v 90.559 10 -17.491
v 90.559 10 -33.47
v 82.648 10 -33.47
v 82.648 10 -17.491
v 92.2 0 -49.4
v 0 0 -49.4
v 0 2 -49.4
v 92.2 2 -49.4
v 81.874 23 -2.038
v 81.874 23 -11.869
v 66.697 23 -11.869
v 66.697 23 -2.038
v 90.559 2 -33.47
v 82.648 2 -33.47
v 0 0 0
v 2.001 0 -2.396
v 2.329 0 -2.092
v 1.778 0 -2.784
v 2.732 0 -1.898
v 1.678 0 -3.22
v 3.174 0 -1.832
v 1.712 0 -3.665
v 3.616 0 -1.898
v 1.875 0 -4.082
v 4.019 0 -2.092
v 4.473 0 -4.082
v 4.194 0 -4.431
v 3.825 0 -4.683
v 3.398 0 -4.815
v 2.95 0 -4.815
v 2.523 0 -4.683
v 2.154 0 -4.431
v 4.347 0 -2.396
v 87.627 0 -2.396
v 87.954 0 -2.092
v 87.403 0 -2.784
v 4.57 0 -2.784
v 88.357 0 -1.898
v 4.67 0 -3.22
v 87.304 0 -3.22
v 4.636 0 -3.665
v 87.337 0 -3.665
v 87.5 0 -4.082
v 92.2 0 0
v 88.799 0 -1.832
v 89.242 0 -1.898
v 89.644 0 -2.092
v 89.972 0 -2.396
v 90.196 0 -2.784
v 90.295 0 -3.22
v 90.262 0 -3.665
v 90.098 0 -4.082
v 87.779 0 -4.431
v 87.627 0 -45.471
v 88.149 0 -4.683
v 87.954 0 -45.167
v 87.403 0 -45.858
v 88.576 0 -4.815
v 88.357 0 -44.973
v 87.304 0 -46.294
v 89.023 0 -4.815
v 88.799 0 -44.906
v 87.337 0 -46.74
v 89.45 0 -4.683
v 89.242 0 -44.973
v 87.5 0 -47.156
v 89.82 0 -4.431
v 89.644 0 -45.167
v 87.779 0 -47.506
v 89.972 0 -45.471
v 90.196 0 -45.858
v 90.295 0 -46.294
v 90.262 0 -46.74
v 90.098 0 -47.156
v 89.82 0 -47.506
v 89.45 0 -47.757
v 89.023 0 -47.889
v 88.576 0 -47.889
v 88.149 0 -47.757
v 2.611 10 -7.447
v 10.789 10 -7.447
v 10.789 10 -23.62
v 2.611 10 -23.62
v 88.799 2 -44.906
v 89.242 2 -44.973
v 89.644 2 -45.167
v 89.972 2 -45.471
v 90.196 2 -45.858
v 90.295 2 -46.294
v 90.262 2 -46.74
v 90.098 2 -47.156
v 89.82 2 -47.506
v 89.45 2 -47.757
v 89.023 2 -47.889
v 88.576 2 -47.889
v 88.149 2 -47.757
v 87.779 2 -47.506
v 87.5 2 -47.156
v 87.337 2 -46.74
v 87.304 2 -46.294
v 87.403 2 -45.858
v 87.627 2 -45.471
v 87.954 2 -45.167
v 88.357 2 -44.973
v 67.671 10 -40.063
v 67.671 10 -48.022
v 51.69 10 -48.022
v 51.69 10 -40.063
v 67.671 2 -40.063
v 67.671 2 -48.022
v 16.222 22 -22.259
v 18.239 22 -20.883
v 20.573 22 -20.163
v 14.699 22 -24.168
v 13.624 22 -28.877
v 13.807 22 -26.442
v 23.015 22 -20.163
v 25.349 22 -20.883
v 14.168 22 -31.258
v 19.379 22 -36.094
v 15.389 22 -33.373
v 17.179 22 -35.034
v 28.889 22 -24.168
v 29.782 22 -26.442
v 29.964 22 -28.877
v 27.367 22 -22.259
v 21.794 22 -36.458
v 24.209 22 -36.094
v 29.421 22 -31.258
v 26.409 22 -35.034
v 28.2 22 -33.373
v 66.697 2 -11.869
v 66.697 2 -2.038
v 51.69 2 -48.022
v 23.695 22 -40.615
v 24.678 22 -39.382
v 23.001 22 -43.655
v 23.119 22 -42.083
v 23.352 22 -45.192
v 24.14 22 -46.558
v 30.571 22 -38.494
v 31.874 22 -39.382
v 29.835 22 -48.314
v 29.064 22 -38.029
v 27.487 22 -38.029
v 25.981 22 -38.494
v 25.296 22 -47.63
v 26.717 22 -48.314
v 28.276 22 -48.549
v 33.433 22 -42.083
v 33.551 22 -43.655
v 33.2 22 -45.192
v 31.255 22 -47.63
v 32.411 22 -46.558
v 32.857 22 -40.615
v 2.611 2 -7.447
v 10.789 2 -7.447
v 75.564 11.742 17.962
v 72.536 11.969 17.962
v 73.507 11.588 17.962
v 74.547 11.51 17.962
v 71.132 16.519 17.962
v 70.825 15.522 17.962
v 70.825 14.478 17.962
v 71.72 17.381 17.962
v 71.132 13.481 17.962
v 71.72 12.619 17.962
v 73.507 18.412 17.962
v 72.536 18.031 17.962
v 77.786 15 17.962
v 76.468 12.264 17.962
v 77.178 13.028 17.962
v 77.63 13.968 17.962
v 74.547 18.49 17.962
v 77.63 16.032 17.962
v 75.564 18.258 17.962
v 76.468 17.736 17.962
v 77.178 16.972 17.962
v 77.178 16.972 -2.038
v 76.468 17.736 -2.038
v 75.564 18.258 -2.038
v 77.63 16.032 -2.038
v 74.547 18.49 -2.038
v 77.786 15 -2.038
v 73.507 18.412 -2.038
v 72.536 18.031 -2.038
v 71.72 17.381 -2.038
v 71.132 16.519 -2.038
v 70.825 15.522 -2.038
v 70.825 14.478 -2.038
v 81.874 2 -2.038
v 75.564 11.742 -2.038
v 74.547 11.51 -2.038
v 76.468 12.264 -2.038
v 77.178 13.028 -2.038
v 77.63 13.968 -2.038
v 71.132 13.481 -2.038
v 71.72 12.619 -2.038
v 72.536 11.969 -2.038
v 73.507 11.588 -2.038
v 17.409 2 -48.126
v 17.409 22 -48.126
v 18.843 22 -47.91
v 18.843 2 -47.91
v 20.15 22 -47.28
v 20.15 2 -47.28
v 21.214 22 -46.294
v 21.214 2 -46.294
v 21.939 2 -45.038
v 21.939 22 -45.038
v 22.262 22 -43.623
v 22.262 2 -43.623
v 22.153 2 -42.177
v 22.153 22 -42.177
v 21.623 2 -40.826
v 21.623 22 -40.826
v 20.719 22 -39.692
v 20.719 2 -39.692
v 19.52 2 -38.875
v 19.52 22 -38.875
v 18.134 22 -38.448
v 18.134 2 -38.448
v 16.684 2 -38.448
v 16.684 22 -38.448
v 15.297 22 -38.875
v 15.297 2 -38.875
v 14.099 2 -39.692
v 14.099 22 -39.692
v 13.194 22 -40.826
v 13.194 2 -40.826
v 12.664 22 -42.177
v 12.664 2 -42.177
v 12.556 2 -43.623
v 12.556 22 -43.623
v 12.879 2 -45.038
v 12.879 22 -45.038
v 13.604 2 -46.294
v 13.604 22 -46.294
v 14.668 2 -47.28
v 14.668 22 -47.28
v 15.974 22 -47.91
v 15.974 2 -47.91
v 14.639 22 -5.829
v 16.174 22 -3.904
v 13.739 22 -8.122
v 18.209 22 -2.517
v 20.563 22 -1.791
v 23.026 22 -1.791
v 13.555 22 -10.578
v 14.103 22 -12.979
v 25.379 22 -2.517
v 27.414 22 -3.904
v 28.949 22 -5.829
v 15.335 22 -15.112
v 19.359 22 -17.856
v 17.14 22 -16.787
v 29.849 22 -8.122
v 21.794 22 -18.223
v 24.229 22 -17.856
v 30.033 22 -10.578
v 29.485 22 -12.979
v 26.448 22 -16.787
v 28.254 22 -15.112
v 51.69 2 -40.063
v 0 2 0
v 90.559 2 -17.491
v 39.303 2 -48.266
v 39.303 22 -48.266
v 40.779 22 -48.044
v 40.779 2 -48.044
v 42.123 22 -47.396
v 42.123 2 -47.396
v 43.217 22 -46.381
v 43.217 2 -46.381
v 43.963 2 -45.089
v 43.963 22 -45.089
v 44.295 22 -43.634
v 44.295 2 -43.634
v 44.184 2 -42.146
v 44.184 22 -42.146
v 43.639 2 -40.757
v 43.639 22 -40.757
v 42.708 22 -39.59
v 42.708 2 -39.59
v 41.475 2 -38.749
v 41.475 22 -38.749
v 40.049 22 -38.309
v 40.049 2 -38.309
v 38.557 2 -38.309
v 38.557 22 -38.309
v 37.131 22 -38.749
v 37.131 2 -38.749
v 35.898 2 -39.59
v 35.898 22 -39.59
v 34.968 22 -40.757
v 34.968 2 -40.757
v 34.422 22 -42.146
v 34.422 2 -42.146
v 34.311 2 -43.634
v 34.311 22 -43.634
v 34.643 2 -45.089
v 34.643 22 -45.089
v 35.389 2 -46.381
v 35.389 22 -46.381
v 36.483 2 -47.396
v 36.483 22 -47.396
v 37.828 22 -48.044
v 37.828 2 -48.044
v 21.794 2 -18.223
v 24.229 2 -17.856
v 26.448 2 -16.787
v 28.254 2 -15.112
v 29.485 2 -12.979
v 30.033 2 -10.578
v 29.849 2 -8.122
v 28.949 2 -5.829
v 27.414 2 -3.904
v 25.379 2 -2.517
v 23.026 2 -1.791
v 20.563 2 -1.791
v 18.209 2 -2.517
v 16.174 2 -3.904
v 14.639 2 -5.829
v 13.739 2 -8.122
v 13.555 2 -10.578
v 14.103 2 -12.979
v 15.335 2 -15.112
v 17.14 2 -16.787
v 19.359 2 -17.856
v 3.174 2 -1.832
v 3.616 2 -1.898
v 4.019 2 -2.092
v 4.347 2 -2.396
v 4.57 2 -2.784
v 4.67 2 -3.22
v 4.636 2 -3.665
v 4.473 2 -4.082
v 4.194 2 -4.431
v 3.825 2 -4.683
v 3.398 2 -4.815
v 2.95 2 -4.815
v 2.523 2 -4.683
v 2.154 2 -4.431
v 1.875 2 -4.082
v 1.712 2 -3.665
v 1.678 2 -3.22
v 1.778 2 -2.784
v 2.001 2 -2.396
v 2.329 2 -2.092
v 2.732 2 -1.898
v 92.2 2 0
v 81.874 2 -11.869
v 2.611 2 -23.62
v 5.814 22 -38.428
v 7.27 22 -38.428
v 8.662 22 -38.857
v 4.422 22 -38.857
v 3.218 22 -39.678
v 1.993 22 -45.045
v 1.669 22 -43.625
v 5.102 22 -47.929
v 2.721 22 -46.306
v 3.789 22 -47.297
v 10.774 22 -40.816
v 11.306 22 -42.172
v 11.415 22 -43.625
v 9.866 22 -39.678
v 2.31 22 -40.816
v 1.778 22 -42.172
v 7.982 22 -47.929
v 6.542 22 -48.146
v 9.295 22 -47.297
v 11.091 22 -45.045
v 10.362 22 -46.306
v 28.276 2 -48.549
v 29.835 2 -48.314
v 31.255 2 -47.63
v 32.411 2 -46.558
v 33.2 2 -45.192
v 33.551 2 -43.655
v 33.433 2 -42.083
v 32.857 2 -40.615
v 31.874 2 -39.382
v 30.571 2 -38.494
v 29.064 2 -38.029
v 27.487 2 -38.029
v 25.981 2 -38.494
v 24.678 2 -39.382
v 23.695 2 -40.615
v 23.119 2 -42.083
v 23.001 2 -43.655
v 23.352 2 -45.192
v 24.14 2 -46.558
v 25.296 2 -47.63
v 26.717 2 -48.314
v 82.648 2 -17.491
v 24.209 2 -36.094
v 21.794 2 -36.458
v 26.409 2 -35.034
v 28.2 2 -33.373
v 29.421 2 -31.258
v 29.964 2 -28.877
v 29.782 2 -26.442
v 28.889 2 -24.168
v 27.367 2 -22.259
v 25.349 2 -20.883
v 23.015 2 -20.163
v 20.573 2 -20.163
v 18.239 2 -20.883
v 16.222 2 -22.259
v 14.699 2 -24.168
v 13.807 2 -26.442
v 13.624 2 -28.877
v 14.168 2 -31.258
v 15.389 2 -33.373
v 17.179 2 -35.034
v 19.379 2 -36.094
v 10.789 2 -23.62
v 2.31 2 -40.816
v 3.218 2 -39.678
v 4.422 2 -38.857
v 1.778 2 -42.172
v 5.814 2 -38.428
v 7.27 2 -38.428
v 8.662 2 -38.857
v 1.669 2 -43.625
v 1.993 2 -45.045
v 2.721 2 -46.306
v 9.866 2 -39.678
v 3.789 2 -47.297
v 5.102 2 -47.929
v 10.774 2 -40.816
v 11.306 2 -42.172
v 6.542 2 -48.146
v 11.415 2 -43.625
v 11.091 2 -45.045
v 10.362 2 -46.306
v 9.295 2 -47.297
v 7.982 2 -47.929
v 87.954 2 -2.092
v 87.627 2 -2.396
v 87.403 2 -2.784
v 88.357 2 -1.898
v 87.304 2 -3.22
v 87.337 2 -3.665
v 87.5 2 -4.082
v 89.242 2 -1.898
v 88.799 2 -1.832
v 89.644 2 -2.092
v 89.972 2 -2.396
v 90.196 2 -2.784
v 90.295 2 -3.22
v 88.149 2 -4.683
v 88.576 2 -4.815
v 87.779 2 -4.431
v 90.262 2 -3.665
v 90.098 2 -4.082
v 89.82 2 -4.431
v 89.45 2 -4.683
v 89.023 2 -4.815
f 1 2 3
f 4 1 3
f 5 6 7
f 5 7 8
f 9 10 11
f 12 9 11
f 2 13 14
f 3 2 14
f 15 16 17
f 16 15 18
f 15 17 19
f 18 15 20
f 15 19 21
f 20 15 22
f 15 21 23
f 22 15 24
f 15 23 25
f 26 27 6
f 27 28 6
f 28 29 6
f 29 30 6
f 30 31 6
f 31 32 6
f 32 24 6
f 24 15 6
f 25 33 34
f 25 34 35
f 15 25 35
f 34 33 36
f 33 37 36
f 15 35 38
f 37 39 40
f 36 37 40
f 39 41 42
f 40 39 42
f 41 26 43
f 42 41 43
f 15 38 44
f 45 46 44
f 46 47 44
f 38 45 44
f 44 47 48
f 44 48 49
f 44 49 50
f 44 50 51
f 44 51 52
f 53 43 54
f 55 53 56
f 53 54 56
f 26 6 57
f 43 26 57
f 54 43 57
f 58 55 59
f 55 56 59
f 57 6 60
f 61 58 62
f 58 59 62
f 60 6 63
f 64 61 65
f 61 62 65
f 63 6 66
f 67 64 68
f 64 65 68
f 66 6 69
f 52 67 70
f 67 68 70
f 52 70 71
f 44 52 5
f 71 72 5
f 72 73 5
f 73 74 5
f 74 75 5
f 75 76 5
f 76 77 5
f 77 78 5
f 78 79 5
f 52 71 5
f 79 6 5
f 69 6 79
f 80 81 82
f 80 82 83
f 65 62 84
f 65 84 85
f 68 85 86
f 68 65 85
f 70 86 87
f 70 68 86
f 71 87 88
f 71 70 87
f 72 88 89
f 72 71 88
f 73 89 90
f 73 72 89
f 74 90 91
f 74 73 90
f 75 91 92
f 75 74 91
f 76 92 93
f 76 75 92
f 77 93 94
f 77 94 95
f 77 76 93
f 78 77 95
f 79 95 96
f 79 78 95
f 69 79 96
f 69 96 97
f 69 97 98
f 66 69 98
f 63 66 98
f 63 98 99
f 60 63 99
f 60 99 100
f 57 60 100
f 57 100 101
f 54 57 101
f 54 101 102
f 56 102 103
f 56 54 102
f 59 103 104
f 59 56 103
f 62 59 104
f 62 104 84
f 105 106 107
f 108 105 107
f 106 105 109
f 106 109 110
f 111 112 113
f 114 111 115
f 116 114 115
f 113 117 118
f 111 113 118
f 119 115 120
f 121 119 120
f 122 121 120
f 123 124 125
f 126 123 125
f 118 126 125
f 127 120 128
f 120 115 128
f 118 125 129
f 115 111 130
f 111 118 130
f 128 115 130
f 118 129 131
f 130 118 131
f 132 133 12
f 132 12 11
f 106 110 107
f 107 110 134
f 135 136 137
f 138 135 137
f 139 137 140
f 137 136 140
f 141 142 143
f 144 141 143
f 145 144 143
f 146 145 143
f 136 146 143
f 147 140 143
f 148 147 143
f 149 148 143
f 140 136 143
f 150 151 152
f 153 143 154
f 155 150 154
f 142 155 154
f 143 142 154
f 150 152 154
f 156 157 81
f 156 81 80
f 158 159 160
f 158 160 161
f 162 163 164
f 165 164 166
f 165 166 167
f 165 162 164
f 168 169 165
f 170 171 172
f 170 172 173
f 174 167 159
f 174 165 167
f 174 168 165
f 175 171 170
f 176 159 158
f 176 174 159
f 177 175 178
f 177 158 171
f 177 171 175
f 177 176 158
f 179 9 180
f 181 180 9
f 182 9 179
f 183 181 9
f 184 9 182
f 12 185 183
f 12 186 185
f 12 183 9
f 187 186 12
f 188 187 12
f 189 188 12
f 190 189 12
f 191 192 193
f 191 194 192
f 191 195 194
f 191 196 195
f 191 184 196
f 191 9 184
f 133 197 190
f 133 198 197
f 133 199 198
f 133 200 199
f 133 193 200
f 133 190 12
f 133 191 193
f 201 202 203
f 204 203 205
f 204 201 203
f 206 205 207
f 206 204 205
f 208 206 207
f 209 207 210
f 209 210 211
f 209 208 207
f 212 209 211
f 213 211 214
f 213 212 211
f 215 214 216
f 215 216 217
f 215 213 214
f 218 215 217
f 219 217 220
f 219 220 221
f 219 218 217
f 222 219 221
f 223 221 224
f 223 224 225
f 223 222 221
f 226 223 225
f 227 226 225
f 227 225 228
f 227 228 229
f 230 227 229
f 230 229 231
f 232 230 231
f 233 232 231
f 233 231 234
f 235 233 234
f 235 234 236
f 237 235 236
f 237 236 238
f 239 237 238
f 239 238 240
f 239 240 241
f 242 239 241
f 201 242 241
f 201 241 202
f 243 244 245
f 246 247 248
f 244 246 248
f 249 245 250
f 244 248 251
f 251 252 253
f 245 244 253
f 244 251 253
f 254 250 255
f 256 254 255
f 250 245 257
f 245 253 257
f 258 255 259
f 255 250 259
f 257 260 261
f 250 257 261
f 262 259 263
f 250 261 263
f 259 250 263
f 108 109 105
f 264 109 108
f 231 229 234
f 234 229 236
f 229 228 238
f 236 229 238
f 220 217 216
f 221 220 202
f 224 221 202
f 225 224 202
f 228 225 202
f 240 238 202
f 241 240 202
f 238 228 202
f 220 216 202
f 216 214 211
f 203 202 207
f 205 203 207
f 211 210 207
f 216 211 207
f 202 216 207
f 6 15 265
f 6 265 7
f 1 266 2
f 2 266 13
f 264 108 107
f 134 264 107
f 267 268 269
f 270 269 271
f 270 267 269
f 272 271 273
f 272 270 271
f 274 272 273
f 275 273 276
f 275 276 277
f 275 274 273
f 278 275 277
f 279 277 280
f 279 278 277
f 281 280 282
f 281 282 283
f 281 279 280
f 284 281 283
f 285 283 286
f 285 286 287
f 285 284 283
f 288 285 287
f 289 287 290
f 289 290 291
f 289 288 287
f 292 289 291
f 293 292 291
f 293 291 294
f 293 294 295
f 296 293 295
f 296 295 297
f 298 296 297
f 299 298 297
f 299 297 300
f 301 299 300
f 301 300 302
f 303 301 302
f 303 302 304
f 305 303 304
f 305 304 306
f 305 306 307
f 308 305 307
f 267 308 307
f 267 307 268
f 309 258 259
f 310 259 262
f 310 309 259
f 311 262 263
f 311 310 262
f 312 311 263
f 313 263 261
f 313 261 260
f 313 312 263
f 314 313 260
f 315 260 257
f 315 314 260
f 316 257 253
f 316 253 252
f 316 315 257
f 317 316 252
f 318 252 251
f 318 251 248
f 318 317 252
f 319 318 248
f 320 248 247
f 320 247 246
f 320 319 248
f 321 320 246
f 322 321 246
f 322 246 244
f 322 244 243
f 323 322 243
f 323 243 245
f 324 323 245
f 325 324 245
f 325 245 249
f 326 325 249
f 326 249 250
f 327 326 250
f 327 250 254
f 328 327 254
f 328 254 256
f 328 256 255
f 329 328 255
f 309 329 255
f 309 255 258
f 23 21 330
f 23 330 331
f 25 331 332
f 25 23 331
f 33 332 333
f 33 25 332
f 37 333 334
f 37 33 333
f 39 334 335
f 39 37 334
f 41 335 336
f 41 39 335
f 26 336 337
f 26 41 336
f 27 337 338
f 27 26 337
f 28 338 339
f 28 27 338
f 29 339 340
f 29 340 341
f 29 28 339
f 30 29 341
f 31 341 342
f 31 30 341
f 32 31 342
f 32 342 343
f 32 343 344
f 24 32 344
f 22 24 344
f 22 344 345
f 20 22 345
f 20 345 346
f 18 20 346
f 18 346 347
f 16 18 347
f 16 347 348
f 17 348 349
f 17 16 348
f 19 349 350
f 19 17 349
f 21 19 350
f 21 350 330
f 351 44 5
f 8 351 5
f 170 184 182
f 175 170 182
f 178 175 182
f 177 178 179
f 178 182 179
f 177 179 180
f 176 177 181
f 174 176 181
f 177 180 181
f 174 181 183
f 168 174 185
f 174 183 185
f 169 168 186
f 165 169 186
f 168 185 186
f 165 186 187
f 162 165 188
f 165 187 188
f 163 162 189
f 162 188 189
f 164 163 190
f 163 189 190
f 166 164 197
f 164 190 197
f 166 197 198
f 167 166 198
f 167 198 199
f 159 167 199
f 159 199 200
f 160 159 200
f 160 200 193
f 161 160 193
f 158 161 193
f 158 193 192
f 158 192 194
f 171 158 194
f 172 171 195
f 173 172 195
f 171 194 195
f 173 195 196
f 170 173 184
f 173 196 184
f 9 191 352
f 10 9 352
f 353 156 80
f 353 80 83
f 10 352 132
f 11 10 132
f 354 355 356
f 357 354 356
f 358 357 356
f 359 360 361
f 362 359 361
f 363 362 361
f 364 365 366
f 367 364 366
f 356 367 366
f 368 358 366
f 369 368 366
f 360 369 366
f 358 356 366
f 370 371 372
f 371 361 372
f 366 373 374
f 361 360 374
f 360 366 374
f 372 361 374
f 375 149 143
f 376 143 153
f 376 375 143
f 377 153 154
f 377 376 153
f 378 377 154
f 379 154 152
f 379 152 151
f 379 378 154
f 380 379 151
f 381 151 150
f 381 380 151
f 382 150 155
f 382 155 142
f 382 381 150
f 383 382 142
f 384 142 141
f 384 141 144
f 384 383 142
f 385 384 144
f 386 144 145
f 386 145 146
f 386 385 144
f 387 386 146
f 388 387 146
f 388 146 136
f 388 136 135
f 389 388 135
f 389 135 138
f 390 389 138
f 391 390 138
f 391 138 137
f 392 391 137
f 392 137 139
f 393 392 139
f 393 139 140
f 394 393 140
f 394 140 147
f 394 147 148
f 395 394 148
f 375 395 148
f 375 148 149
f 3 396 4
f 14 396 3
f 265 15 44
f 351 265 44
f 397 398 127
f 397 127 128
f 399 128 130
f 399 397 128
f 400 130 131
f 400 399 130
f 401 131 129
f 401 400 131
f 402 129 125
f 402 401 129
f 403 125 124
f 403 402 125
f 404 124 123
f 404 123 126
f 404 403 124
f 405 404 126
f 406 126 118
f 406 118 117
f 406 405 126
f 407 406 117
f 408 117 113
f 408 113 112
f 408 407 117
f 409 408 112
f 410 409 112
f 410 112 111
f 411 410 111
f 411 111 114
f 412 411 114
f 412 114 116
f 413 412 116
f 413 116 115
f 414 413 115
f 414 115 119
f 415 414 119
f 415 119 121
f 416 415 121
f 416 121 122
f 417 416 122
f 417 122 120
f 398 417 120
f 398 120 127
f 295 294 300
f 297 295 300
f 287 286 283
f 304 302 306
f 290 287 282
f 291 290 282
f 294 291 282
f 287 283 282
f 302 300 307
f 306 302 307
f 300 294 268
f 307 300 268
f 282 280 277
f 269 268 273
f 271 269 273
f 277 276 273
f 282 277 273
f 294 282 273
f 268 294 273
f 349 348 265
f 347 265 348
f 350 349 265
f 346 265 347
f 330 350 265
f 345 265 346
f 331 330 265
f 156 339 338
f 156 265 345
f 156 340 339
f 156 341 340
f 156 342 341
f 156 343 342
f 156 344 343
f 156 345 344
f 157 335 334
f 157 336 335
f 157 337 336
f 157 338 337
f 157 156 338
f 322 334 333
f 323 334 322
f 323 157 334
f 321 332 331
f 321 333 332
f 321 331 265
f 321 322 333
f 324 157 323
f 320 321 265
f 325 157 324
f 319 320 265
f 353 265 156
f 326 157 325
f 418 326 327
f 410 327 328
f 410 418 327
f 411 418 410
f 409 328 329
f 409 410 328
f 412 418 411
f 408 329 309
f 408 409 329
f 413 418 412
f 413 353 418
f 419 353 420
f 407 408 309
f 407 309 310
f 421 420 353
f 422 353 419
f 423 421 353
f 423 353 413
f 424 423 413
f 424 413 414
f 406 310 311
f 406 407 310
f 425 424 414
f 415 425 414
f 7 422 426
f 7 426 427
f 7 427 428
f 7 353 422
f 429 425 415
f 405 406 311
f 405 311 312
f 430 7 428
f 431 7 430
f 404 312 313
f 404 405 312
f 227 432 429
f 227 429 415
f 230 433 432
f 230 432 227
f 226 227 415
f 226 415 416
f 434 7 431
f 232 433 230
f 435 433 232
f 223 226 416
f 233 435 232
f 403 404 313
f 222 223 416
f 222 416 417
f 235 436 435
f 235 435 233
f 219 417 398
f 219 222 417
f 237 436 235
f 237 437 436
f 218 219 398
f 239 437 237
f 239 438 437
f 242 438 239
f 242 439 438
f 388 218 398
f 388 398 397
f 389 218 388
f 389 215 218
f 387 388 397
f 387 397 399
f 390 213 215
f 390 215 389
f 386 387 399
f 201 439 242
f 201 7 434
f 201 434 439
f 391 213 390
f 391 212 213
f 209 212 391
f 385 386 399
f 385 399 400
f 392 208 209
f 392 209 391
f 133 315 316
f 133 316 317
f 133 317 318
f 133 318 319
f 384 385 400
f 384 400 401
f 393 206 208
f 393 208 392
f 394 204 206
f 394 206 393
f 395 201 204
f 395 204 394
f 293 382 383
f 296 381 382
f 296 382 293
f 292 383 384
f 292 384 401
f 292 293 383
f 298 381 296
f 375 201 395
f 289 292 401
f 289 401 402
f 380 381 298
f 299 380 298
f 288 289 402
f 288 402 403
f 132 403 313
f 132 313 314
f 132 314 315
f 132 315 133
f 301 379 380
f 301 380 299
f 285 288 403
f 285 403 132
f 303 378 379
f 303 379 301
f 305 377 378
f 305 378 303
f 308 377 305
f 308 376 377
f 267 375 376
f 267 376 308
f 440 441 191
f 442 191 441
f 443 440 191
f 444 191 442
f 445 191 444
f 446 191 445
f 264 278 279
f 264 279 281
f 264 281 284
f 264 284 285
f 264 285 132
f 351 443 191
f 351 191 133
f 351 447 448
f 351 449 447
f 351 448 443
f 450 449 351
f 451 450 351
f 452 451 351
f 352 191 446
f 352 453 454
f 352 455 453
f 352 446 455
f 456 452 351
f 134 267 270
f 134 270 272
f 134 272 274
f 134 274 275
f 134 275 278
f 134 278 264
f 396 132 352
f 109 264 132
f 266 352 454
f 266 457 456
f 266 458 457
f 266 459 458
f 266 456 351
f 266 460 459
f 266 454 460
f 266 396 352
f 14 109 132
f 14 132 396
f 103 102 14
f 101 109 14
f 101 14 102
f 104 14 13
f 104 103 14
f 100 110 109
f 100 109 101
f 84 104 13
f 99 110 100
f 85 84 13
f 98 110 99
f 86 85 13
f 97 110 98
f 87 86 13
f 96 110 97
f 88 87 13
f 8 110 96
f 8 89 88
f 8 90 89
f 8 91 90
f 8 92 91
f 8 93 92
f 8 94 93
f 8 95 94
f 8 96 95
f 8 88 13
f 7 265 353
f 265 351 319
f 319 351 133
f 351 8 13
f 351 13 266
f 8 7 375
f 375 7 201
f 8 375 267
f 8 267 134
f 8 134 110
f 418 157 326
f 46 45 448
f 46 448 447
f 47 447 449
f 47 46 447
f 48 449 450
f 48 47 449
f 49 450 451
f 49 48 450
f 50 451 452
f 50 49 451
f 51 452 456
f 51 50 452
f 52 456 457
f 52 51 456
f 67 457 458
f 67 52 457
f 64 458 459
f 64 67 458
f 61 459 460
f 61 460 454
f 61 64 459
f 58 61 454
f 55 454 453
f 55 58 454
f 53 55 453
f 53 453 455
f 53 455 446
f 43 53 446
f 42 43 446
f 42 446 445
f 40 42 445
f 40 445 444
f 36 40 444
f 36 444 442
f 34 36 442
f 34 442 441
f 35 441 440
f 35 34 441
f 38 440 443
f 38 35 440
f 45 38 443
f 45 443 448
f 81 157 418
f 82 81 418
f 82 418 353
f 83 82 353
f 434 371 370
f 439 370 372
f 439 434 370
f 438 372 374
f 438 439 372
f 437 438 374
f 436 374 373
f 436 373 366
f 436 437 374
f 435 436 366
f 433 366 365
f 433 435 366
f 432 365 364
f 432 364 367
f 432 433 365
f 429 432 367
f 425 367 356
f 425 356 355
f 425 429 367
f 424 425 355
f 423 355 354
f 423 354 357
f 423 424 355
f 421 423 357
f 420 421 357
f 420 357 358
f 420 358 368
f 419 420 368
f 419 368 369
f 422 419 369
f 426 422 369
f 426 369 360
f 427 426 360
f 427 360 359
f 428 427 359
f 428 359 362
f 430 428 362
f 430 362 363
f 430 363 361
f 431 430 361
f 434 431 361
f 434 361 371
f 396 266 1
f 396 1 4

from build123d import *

# Parameters (mm, degrees)
SKETCH1_W           = 92.2
SKETCH1_H           = 49.4
SKETCH1_R           = 1.5
SKETCH1_R_2         = 8.262166988
SKETCH1_R_3         = 8.192856998
SKETCH1_R_4         = 4.886635654
SKETCH1_R_5         = 4.866362118
SKETCH1_R_6         = 5.289603921
SKETCH1_R_7         = 5.006266963
SKETCH1_W_2         = 8.178065913
SKETCH1_H_2         = 16.173235784
SKETCH1_W_3         = 15.980396505
SKETCH1_H_3         = 7.959466721
SKETCH1_W_4         = 7.911671113
SKETCH1_H_4         = 15.979493629
SKETCH1_W_5         = 15.177608392
SKETCH1_H_5         = 9.83005725
BOSS_EXTRUDE1_DEPTH = 2
SKETCH3_W           = 8.178065913
SKETCH3_H           = 16.173235784
SKETCH3_W_2         = 15.980396505
SKETCH3_H_2         = 7.959466721
SKETCH3_W_3         = 7.911671113
SKETCH3_H_3         = 15.979493629
BOSS_EXTRUDE2_DEPTH = 10
SKETCH4_R           = 8.192856998
SKETCH4_R_2         = 8.262166988
SKETCH4_R_3         = 4.886635654
SKETCH4_R_4         = 4.866362118
SKETCH4_R_5         = 5.289603921
SKETCH4_R_6         = 5.006266963
BOSS_EXTRUDE3_DEPTH = 22
SKETCH5_W           = 15.177608392
SKETCH5_H           = 9.83005725
BOSS_EXTRUDE4_DEPTH = 23
SKETCH6_R           = 3.5
BOSS_EXTRUDE5_DEPTH = 20


with BuildPart() as part:
    # Sketch1 → Boss-Extrude1 (new body)
    with BuildSketch(Plane(origin=(0, 0, 0), x_dir=(1, 0, 0), z_dir=(0, 1, 0))):
        with Locations((46.1, 24.7)):
            Rectangle(SKETCH1_W, SKETCH1_H)
        with Locations(Location((3.173958683, 3.331705549, 0), (0, 0, 270))):
            Circle(SKETCH1_R, mode=Mode.SUBTRACT)
        with Locations(Location((88.799397051, 46.406009575, 0), (0, 0, 270))):
            Circle(SKETCH1_R, mode=Mode.SUBTRACT)
        with Locations(Location((88.799397051, 3.331705549, 0), (0, 0, 270))):
            Circle(SKETCH1_R, mode=Mode.SUBTRACT)
        with Locations(Location((21.794183192, 9.960470024, 0), (0, 0, 270))):
            Circle(SKETCH1_R_2, mode=Mode.SUBTRACT)
        with Locations(Location((21.794183192, 28.264813263, 0), (0, 0, 270))):
            Circle(SKETCH1_R_3, mode=Mode.SUBTRACT)
        with Locations(Location((6.541955346, 43.259679485, 0), (0, 0, 270))):
            Circle(SKETCH1_R_4, mode=Mode.SUBTRACT)
        with Locations(Location((17.408846233, 43.259679485, 0), (0, 0, 270))):
            Circle(SKETCH1_R_5, mode=Mode.SUBTRACT)
        with Locations(Location((28.27573712, 43.259679485, 0), (0, 0, 270))):
            Circle(SKETCH1_R_6, mode=Mode.SUBTRACT)
        with Locations(Location((39.303222454, 43.259679485, 0), (0, 0, 270))):
            Circle(SKETCH1_R_7, mode=Mode.SUBTRACT)
        with Locations((6.70046548, 15.533525735)):
            Rectangle(SKETCH1_W_2, SKETCH1_H_2, mode=Mode.SUBTRACT)
        with Locations((59.680344983, 44.042689104)):
            Rectangle(SKETCH1_W_3, SKETCH1_H_3, mode=Mode.SUBTRACT)
        with Locations((86.603660988, 25.480585451)):
            Rectangle(SKETCH1_W_4, SKETCH1_H_4, mode=Mode.SUBTRACT)
        with Locations((74.28567685, 6.953513815)):
            Rectangle(SKETCH1_W_5, SKETCH1_H_5, mode=Mode.SUBTRACT)
    extrude(amount=BOSS_EXTRUDE1_DEPTH)

    # Sketch3 → Boss-Extrude2 (add)
    with BuildSketch(Plane(origin=(0, 0, 0), x_dir=(-1, 0, 0), z_dir=(0, -1, 0))):
        with Locations((-6.70046548, 15.533525735)):
            Rectangle(SKETCH3_W, SKETCH3_H)
        with Locations((-59.680344983, 44.042689104)):
            Rectangle(SKETCH3_W_2, SKETCH3_H_2)
        with Locations((-86.603660988, 25.480585451)):
            Rectangle(SKETCH3_W_3, SKETCH3_H_3)
    extrude(amount=-BOSS_EXTRUDE2_DEPTH)

    # Sketch4 → Boss-Extrude3 (add)
    with BuildSketch(Plane(origin=(0, 0, 0), x_dir=(-1, 0, 0), z_dir=(0, -1, 0))):
        with Locations(Location((-21.794183192, 28.264813263, 0), (0, 0, 90))):
            Circle(SKETCH4_R)
        with Locations(Location((-21.794183192, 9.960470024, 0), (0, 0, 90))):
            Circle(SKETCH4_R_2)
        with Locations(Location((-6.541955346, 43.259679485, 0), (0, 0, 90))):
            Circle(SKETCH4_R_3)
        with Locations(Location((-17.408846233, 43.259679485, 0), (0, 0, 90))):
            Circle(SKETCH4_R_4)
        with Locations(Location((-28.27573712, 43.259679485, 0), (0, 0, 90))):
            Circle(SKETCH4_R_5)
        with Locations(Location((-39.303222454, 43.259679485, 0), (0, 0, 90))):
            Circle(SKETCH4_R_6)
    extrude(amount=-BOSS_EXTRUDE3_DEPTH)

    # Sketch5 → Boss-Extrude4 (add)
    with BuildSketch(Plane(origin=(0, 0, 0), x_dir=(-1, 0, 0), z_dir=(0, -1, 0))):
        with Locations((-74.28567685, 6.953513815)):
            Rectangle(SKETCH5_W, SKETCH5_H)
    extrude(amount=-BOSS_EXTRUDE4_DEPTH)

    # Sketch6 → Boss-Extrude5 (add)
    with BuildSketch(Plane.XY.offset(-2.03848519)):
        with Locations((74.28567685, 15)):
            Circle(SKETCH6_R)
    extrude(amount=BOSS_EXTRUDE5_DEPTH)


solid = part.part
